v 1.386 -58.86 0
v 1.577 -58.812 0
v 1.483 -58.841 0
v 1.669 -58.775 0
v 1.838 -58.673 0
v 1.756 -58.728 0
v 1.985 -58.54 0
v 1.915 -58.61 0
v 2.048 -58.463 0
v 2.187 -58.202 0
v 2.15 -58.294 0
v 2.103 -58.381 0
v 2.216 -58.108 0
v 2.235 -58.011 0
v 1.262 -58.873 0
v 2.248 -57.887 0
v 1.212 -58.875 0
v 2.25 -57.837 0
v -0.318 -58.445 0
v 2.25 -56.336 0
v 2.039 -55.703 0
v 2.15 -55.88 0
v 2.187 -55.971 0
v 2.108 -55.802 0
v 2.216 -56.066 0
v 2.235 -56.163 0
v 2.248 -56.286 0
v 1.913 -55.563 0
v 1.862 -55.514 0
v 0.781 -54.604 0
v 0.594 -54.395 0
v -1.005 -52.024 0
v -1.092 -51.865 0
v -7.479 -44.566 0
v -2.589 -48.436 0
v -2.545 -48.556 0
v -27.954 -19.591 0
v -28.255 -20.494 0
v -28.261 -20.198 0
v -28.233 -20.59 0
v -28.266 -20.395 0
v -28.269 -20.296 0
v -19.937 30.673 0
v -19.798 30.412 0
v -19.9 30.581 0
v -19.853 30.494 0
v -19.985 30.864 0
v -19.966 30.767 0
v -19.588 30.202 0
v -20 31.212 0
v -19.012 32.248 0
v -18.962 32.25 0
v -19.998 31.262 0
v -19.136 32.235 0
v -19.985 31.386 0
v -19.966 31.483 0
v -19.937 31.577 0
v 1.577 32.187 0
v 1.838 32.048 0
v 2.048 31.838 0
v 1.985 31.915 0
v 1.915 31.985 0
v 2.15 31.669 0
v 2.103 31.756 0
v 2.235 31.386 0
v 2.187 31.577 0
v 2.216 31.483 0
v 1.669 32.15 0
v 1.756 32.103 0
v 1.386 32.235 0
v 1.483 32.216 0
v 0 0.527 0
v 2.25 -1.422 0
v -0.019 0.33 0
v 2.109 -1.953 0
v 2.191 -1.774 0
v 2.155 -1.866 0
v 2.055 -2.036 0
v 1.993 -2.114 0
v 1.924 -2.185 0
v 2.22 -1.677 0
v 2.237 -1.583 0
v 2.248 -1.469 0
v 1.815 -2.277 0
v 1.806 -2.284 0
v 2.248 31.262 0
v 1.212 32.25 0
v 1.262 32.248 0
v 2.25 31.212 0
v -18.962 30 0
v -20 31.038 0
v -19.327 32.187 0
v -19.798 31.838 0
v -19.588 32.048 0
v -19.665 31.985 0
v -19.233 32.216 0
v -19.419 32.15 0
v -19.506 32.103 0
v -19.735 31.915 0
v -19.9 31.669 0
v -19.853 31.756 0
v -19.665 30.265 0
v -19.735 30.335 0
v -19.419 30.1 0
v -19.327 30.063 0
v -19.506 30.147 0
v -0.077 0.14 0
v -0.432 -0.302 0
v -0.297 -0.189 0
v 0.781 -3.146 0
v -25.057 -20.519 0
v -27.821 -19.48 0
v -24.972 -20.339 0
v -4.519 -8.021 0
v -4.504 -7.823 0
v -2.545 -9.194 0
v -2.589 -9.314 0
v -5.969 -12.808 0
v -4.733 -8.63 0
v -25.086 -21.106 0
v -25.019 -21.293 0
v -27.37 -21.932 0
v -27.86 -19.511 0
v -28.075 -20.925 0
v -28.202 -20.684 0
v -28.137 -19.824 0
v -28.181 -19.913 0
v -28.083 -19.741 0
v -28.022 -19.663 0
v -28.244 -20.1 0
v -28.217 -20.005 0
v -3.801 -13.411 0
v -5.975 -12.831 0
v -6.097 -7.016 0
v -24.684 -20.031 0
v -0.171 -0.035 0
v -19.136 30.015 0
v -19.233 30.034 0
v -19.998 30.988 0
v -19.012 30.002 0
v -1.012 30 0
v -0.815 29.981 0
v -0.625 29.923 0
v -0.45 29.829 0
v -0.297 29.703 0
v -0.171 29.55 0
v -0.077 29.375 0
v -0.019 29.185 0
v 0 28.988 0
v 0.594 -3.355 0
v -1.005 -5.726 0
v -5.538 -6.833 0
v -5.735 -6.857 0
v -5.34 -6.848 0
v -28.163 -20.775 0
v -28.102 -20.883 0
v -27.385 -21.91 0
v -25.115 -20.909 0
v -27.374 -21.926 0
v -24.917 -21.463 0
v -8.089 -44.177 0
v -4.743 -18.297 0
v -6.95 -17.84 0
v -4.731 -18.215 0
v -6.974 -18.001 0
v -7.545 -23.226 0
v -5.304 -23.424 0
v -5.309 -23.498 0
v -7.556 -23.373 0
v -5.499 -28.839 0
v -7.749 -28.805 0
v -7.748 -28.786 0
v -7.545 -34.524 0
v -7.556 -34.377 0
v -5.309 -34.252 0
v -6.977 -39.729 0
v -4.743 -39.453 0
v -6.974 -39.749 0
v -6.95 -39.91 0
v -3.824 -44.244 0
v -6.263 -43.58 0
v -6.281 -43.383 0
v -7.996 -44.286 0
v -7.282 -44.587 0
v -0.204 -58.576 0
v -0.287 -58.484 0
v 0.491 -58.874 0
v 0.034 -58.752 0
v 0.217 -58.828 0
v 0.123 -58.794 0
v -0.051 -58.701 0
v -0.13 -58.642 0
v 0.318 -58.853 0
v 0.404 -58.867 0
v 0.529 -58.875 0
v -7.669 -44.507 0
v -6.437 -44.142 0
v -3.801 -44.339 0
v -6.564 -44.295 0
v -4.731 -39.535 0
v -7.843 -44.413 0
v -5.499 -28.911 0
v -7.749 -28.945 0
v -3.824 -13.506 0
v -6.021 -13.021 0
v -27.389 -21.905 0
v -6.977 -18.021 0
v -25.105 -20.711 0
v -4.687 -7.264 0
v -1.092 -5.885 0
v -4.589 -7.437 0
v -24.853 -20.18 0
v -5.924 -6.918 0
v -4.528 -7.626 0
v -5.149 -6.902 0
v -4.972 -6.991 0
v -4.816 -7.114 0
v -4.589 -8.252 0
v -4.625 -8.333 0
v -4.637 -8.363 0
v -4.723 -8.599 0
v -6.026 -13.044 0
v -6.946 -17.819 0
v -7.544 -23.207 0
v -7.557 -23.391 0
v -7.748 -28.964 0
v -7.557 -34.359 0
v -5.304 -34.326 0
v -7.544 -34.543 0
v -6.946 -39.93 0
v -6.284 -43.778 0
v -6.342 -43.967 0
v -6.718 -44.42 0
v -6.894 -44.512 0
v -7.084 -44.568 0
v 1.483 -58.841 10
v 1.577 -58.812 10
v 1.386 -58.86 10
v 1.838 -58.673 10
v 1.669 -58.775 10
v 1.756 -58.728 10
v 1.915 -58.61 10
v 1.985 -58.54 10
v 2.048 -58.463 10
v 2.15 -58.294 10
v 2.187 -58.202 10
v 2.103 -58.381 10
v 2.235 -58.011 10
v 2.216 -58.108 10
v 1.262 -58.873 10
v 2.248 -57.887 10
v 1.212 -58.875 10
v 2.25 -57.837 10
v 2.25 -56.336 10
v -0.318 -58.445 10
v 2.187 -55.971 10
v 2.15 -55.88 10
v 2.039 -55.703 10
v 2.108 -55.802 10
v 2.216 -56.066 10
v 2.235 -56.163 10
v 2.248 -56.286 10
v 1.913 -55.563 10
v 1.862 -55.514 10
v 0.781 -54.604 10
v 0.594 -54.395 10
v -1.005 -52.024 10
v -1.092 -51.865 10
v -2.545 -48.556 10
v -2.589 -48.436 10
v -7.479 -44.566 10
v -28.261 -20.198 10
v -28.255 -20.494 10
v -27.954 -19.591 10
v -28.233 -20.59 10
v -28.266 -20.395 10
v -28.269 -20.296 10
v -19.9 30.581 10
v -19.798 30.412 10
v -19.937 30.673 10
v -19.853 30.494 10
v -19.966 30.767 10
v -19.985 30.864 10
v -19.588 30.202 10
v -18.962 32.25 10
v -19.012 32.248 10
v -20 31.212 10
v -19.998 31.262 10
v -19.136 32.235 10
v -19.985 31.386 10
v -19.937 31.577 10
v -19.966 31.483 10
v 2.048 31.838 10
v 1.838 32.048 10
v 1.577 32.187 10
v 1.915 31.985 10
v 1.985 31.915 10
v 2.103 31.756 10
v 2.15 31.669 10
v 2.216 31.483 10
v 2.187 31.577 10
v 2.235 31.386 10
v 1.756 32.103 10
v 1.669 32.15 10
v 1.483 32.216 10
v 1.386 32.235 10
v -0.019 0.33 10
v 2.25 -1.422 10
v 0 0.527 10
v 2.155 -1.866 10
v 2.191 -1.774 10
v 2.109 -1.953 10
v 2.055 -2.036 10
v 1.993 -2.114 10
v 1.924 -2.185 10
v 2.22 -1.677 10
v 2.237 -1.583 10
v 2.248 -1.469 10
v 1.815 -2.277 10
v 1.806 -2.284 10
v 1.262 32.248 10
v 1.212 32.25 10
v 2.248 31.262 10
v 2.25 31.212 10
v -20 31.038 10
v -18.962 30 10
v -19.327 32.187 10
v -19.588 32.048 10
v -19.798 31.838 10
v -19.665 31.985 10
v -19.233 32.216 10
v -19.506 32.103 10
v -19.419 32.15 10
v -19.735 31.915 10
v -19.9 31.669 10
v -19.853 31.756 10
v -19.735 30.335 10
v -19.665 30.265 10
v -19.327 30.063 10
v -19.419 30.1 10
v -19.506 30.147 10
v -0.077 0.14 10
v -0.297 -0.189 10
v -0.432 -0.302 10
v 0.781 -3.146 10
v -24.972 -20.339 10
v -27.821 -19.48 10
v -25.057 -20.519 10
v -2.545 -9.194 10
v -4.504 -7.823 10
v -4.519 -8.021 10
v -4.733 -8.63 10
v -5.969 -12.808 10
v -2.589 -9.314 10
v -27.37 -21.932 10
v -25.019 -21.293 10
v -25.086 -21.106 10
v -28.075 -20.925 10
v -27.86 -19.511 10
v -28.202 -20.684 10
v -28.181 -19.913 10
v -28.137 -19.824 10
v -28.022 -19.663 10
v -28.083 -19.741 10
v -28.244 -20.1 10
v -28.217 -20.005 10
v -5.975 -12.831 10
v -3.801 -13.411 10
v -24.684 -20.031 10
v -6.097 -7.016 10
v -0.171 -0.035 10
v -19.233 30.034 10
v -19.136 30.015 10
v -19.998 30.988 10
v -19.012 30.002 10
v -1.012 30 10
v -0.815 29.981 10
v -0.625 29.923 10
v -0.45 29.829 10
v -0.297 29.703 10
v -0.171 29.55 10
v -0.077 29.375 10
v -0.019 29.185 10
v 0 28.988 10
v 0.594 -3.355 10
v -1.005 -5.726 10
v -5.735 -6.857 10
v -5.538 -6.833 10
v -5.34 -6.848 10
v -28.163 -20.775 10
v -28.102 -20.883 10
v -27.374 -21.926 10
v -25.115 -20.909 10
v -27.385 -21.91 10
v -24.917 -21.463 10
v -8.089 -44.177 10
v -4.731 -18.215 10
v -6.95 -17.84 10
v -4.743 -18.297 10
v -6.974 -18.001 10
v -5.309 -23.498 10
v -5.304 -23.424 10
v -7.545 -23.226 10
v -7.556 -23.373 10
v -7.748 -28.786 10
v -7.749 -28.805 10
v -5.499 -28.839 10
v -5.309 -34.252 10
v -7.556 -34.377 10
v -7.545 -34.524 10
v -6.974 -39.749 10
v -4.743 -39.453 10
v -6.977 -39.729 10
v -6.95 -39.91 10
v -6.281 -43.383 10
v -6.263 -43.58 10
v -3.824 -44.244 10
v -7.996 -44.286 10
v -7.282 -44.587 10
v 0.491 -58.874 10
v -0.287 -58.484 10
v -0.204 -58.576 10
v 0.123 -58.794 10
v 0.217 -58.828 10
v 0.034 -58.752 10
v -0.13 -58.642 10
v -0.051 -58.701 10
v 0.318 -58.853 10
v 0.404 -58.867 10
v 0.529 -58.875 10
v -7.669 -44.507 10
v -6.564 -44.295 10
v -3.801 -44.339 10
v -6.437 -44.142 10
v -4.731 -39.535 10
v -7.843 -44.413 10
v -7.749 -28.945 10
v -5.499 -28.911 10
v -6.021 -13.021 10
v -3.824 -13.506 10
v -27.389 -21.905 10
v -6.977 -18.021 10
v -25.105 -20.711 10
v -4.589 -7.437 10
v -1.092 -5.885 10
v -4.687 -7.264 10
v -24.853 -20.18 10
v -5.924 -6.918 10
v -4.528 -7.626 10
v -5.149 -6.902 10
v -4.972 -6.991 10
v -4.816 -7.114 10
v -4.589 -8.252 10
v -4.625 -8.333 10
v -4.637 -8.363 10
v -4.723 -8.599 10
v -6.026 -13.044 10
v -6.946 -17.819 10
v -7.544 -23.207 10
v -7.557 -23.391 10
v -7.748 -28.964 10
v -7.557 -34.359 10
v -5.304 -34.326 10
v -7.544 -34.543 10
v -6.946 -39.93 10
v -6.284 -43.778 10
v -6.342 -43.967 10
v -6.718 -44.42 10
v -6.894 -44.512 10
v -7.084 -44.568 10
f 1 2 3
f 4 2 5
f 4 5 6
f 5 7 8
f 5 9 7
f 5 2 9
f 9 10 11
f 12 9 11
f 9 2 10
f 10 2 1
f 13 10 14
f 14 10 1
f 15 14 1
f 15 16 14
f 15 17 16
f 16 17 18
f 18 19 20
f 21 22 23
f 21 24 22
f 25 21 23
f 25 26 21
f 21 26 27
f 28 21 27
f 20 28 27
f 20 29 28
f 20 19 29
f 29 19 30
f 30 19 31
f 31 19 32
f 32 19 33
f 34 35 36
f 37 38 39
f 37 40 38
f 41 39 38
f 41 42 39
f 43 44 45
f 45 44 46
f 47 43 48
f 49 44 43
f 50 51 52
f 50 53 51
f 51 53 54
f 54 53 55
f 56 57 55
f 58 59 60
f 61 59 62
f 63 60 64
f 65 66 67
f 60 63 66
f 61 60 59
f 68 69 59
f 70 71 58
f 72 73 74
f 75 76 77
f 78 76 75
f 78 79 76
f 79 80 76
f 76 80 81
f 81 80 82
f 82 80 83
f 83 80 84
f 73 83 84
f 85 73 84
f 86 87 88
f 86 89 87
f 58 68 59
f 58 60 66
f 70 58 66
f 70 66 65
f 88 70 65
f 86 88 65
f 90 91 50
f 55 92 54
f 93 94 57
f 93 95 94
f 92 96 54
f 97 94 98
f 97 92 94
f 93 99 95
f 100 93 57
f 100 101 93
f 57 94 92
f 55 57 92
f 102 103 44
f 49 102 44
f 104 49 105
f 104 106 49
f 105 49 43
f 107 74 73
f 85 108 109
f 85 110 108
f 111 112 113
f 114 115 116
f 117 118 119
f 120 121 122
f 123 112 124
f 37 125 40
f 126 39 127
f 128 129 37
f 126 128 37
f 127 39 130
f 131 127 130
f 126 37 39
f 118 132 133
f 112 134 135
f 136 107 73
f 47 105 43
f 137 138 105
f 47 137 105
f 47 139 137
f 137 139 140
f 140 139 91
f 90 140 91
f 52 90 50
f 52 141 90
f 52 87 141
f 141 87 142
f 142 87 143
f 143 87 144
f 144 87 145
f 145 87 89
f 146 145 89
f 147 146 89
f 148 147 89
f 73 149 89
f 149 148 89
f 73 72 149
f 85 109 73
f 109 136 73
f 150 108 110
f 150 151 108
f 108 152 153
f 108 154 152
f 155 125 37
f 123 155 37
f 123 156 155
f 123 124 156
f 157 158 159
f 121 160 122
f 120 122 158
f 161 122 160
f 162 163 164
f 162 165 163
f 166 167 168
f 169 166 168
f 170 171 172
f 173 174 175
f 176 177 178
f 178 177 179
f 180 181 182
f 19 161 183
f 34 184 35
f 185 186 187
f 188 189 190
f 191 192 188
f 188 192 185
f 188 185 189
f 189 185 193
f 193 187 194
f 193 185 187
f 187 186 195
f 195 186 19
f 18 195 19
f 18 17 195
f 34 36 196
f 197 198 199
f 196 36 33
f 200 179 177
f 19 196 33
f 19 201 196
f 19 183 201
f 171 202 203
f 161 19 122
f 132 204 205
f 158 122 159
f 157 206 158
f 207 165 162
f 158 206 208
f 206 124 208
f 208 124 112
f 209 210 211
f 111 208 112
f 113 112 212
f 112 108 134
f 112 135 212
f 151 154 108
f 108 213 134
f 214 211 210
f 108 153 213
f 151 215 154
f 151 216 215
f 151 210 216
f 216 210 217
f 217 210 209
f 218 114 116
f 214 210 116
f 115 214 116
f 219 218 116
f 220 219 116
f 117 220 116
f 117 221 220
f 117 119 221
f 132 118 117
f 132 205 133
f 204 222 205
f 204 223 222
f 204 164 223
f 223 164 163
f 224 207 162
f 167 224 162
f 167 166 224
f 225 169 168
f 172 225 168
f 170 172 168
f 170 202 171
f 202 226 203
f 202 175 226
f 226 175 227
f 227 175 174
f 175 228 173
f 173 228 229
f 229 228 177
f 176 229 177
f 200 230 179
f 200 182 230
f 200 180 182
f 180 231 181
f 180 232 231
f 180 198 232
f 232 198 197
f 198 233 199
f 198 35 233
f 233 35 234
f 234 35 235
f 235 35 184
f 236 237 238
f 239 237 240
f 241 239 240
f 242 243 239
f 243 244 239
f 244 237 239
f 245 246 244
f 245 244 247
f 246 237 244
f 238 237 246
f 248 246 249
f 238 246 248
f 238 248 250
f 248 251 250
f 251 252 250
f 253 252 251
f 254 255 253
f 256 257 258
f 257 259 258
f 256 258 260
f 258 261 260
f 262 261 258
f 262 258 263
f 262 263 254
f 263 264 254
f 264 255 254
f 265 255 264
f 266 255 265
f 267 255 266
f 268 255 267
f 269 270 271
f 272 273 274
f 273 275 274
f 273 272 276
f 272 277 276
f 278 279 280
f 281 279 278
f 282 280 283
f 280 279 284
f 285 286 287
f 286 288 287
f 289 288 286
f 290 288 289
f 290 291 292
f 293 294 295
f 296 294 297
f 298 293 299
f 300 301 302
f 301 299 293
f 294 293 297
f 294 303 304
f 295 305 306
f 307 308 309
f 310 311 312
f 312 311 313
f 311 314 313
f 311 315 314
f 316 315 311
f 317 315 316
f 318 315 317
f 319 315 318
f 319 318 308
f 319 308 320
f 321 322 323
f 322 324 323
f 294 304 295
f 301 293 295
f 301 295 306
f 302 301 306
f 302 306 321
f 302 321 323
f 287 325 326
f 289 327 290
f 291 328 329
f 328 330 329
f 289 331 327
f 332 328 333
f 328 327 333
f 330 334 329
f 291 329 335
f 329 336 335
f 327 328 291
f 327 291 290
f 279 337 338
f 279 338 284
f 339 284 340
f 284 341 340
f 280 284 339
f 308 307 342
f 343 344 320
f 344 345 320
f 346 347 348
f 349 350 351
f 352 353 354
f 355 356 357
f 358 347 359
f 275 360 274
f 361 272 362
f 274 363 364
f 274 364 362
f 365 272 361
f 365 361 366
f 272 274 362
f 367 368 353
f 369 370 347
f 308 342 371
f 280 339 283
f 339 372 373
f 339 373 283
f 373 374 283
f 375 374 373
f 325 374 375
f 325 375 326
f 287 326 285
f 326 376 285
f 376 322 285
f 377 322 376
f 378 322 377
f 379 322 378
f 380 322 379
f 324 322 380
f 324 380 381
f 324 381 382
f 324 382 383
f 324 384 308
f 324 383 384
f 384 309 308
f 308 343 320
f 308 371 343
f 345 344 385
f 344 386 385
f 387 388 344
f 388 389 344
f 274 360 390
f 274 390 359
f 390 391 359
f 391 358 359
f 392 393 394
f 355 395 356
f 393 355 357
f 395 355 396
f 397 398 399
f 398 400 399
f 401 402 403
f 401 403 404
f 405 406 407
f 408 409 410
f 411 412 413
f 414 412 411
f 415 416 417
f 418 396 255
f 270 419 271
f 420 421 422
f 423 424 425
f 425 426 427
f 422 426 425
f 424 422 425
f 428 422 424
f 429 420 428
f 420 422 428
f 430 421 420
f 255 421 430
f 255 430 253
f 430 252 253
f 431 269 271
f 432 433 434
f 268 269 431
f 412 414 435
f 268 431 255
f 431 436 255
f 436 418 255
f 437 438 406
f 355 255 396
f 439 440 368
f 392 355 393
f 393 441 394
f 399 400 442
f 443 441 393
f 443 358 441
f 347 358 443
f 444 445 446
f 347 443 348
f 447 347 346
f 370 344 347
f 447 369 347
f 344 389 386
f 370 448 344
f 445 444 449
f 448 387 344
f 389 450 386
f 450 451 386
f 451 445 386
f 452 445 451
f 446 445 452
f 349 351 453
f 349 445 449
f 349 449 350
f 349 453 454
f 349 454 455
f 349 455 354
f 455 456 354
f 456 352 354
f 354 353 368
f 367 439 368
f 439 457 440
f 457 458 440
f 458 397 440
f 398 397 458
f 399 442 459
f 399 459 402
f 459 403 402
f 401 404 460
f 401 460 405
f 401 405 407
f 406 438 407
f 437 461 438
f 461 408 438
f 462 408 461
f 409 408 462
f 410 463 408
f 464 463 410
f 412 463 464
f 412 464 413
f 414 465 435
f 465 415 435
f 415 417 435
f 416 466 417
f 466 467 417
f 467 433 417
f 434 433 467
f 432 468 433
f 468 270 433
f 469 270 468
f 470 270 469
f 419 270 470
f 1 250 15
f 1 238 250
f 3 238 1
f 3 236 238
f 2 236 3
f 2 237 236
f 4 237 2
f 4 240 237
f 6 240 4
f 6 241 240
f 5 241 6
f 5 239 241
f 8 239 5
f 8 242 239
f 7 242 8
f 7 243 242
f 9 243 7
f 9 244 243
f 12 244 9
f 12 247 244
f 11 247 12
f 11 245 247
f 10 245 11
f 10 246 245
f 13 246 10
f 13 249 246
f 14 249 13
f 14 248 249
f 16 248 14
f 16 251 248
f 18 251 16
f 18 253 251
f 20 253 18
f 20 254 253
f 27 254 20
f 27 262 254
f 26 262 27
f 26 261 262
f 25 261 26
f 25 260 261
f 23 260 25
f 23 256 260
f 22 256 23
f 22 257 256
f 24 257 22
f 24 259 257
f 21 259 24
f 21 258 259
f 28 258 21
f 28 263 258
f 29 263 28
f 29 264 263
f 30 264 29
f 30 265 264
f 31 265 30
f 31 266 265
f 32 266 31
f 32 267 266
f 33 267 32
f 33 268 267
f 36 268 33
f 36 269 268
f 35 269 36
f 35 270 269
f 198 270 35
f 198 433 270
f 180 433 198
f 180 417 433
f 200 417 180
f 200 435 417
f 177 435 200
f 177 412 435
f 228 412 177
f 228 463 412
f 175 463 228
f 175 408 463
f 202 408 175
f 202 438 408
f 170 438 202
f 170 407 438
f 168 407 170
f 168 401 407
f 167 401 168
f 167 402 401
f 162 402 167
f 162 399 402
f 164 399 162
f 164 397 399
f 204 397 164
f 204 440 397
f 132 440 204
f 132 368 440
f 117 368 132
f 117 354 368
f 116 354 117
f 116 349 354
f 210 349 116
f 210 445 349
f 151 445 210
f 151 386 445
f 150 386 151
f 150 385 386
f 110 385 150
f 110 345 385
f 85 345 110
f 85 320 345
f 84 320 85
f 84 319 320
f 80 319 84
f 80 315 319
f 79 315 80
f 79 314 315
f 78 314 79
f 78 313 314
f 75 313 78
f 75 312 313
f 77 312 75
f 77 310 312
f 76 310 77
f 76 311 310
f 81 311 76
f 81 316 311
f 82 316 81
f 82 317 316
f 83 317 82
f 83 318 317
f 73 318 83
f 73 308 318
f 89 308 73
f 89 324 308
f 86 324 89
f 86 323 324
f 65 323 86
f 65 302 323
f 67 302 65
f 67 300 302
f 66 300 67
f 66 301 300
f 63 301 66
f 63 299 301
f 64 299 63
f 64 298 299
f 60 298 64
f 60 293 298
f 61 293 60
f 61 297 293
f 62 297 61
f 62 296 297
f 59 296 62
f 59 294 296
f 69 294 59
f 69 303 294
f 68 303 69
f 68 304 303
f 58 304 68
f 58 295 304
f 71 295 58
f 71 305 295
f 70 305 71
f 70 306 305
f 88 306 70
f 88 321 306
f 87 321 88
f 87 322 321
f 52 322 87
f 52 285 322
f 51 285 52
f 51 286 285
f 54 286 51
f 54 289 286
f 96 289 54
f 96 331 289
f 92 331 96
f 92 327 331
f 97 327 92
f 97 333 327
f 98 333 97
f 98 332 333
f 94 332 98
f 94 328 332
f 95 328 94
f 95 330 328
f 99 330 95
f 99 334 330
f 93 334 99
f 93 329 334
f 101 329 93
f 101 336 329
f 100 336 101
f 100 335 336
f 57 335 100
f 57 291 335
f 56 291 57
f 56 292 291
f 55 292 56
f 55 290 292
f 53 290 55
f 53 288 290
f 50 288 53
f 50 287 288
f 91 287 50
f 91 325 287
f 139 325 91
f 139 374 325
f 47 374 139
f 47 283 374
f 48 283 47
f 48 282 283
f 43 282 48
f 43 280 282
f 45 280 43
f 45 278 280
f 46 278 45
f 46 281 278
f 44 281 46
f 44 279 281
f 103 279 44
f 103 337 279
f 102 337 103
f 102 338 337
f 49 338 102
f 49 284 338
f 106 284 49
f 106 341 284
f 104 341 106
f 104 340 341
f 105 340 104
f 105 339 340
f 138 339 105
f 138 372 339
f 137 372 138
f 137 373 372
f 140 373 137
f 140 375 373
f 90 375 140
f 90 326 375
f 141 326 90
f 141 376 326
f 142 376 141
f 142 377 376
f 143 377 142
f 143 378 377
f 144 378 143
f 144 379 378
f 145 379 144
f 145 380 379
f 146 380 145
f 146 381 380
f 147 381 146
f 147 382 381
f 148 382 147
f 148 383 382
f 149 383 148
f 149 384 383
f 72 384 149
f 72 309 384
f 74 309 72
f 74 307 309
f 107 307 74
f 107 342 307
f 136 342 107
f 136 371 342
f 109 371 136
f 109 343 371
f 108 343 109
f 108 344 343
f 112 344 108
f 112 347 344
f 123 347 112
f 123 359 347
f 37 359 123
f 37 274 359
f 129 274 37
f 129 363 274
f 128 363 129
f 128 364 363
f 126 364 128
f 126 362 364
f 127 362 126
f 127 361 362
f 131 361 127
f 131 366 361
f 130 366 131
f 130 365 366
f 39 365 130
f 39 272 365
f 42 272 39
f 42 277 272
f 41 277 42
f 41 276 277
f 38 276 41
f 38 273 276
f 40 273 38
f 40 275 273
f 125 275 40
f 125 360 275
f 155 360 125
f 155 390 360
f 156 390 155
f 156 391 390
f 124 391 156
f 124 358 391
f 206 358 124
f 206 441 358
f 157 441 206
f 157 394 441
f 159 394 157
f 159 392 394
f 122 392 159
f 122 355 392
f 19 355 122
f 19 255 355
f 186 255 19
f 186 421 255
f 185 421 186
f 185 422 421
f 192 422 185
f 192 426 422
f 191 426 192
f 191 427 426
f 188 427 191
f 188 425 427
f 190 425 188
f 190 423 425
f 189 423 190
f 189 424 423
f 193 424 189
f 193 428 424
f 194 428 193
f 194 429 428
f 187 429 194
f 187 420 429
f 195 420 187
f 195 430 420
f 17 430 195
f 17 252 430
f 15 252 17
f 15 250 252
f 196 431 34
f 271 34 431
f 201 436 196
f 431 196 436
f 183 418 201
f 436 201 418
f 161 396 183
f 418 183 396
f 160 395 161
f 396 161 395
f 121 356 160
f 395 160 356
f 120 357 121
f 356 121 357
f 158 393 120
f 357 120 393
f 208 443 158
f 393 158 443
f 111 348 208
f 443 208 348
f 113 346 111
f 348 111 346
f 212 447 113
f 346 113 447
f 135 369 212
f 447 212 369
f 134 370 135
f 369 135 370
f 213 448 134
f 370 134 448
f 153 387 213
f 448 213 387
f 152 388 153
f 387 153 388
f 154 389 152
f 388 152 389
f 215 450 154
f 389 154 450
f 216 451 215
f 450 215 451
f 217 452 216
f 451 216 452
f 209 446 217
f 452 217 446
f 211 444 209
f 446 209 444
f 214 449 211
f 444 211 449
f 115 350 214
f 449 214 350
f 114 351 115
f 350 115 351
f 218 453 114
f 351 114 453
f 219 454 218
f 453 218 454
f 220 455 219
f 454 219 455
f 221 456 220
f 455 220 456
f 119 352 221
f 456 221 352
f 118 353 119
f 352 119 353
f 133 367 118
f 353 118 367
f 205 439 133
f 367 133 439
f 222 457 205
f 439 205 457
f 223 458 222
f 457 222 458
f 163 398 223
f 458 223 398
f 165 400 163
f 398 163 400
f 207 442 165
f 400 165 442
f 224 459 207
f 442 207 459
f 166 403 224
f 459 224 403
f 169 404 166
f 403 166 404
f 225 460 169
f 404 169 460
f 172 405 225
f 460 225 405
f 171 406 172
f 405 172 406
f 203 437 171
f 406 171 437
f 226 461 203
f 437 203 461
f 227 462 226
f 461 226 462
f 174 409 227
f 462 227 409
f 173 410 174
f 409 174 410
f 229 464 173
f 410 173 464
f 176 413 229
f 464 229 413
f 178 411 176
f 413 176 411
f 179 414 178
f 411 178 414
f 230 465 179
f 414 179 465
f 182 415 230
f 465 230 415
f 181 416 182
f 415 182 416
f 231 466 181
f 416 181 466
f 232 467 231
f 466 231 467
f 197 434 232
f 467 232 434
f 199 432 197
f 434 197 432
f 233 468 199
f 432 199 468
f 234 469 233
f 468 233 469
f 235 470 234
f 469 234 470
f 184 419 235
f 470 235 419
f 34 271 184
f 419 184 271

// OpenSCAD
// Parametric Headphone Holder for Monitor
// May 08, 2019
// https://www.thingiverse.com/thing:3617042
// by Bikecyclist
// https://www.thingiverse.com/Bikecyclist
//
// Remix of
//
// Headphonestand for Monitor
// https://www.thingiverse.com/thing:3483155
// by 
// https://www.thingiverse.com/ZibbiDasZebra

/* [Main Parameters] */

// Length of monitor top (front to back)
monitor_len = 30;

// Height of hook on monitor front edge (bottom to top)
h_front = 20;

// Angle of support on monitor backside (0 = vertical)
a_sup = 35;

// Number of facets
$fn = 32;

/* [Secondary Parameters] */

// Length of hook for headphone
l_hook = 60;

// Depth of curved indentation in hook (don't go too deep - remember Moria!)
d_hook = 10;

// Length of monitor support (can usually remain unchanged)
l_sup = 35;

// Width of the hook (left to right)
w_hook = 10;

// Thickness of hook material
th = 2.25;

/* [Hidden] */

// Small distance to ensure proper meshing
eps = 0.01;

/* Now unused code for important ZibbiDasZebra's original design for reference
color ("red")
mirror ([0, 1, 0])
translate ([44.25 + 2.25/2, -1.8, -11])
import ("headphonestand_for_monitor.stl");
*/

hook (w_hook);

module hook (h)
{
    linear_extrude (h)
    {
        offset (-th/2 * 0.9)
        offset (th/2 * 0.9)
        difference ()
        {
            offset (th/2 * 0.9)
            offset (-th/2 * 0.9)
            hook_xsection ();
            
            offset (-th)
            hook_xsection ();
        }
    }
}

module hook_xsection ()
{
    translate ([0, -th])
    square ([th, monitor_len + 2 * th]);

    translate ([-h_front, monitor_len])
    square ([h_front + th, th]);

    difference ()
    {
        hull ()
        {
            rotate ([0, 0, a_sup])
            translate ([-l_sup/2, -th/2])
            square ([l_sup, th], center = true);
            
            translate ([th/2, -l_hook + th])
            square ([th, th], center = true);
            
            translate ([th/2, -th/2])
            square ([th, th], center = true);
        }
        
        translate ([th + th, -(l_hook - th)/2])
        resize ([2 * d_hook, l_hook - 2 * th])
        circle (d = l_hook);
    }
}
